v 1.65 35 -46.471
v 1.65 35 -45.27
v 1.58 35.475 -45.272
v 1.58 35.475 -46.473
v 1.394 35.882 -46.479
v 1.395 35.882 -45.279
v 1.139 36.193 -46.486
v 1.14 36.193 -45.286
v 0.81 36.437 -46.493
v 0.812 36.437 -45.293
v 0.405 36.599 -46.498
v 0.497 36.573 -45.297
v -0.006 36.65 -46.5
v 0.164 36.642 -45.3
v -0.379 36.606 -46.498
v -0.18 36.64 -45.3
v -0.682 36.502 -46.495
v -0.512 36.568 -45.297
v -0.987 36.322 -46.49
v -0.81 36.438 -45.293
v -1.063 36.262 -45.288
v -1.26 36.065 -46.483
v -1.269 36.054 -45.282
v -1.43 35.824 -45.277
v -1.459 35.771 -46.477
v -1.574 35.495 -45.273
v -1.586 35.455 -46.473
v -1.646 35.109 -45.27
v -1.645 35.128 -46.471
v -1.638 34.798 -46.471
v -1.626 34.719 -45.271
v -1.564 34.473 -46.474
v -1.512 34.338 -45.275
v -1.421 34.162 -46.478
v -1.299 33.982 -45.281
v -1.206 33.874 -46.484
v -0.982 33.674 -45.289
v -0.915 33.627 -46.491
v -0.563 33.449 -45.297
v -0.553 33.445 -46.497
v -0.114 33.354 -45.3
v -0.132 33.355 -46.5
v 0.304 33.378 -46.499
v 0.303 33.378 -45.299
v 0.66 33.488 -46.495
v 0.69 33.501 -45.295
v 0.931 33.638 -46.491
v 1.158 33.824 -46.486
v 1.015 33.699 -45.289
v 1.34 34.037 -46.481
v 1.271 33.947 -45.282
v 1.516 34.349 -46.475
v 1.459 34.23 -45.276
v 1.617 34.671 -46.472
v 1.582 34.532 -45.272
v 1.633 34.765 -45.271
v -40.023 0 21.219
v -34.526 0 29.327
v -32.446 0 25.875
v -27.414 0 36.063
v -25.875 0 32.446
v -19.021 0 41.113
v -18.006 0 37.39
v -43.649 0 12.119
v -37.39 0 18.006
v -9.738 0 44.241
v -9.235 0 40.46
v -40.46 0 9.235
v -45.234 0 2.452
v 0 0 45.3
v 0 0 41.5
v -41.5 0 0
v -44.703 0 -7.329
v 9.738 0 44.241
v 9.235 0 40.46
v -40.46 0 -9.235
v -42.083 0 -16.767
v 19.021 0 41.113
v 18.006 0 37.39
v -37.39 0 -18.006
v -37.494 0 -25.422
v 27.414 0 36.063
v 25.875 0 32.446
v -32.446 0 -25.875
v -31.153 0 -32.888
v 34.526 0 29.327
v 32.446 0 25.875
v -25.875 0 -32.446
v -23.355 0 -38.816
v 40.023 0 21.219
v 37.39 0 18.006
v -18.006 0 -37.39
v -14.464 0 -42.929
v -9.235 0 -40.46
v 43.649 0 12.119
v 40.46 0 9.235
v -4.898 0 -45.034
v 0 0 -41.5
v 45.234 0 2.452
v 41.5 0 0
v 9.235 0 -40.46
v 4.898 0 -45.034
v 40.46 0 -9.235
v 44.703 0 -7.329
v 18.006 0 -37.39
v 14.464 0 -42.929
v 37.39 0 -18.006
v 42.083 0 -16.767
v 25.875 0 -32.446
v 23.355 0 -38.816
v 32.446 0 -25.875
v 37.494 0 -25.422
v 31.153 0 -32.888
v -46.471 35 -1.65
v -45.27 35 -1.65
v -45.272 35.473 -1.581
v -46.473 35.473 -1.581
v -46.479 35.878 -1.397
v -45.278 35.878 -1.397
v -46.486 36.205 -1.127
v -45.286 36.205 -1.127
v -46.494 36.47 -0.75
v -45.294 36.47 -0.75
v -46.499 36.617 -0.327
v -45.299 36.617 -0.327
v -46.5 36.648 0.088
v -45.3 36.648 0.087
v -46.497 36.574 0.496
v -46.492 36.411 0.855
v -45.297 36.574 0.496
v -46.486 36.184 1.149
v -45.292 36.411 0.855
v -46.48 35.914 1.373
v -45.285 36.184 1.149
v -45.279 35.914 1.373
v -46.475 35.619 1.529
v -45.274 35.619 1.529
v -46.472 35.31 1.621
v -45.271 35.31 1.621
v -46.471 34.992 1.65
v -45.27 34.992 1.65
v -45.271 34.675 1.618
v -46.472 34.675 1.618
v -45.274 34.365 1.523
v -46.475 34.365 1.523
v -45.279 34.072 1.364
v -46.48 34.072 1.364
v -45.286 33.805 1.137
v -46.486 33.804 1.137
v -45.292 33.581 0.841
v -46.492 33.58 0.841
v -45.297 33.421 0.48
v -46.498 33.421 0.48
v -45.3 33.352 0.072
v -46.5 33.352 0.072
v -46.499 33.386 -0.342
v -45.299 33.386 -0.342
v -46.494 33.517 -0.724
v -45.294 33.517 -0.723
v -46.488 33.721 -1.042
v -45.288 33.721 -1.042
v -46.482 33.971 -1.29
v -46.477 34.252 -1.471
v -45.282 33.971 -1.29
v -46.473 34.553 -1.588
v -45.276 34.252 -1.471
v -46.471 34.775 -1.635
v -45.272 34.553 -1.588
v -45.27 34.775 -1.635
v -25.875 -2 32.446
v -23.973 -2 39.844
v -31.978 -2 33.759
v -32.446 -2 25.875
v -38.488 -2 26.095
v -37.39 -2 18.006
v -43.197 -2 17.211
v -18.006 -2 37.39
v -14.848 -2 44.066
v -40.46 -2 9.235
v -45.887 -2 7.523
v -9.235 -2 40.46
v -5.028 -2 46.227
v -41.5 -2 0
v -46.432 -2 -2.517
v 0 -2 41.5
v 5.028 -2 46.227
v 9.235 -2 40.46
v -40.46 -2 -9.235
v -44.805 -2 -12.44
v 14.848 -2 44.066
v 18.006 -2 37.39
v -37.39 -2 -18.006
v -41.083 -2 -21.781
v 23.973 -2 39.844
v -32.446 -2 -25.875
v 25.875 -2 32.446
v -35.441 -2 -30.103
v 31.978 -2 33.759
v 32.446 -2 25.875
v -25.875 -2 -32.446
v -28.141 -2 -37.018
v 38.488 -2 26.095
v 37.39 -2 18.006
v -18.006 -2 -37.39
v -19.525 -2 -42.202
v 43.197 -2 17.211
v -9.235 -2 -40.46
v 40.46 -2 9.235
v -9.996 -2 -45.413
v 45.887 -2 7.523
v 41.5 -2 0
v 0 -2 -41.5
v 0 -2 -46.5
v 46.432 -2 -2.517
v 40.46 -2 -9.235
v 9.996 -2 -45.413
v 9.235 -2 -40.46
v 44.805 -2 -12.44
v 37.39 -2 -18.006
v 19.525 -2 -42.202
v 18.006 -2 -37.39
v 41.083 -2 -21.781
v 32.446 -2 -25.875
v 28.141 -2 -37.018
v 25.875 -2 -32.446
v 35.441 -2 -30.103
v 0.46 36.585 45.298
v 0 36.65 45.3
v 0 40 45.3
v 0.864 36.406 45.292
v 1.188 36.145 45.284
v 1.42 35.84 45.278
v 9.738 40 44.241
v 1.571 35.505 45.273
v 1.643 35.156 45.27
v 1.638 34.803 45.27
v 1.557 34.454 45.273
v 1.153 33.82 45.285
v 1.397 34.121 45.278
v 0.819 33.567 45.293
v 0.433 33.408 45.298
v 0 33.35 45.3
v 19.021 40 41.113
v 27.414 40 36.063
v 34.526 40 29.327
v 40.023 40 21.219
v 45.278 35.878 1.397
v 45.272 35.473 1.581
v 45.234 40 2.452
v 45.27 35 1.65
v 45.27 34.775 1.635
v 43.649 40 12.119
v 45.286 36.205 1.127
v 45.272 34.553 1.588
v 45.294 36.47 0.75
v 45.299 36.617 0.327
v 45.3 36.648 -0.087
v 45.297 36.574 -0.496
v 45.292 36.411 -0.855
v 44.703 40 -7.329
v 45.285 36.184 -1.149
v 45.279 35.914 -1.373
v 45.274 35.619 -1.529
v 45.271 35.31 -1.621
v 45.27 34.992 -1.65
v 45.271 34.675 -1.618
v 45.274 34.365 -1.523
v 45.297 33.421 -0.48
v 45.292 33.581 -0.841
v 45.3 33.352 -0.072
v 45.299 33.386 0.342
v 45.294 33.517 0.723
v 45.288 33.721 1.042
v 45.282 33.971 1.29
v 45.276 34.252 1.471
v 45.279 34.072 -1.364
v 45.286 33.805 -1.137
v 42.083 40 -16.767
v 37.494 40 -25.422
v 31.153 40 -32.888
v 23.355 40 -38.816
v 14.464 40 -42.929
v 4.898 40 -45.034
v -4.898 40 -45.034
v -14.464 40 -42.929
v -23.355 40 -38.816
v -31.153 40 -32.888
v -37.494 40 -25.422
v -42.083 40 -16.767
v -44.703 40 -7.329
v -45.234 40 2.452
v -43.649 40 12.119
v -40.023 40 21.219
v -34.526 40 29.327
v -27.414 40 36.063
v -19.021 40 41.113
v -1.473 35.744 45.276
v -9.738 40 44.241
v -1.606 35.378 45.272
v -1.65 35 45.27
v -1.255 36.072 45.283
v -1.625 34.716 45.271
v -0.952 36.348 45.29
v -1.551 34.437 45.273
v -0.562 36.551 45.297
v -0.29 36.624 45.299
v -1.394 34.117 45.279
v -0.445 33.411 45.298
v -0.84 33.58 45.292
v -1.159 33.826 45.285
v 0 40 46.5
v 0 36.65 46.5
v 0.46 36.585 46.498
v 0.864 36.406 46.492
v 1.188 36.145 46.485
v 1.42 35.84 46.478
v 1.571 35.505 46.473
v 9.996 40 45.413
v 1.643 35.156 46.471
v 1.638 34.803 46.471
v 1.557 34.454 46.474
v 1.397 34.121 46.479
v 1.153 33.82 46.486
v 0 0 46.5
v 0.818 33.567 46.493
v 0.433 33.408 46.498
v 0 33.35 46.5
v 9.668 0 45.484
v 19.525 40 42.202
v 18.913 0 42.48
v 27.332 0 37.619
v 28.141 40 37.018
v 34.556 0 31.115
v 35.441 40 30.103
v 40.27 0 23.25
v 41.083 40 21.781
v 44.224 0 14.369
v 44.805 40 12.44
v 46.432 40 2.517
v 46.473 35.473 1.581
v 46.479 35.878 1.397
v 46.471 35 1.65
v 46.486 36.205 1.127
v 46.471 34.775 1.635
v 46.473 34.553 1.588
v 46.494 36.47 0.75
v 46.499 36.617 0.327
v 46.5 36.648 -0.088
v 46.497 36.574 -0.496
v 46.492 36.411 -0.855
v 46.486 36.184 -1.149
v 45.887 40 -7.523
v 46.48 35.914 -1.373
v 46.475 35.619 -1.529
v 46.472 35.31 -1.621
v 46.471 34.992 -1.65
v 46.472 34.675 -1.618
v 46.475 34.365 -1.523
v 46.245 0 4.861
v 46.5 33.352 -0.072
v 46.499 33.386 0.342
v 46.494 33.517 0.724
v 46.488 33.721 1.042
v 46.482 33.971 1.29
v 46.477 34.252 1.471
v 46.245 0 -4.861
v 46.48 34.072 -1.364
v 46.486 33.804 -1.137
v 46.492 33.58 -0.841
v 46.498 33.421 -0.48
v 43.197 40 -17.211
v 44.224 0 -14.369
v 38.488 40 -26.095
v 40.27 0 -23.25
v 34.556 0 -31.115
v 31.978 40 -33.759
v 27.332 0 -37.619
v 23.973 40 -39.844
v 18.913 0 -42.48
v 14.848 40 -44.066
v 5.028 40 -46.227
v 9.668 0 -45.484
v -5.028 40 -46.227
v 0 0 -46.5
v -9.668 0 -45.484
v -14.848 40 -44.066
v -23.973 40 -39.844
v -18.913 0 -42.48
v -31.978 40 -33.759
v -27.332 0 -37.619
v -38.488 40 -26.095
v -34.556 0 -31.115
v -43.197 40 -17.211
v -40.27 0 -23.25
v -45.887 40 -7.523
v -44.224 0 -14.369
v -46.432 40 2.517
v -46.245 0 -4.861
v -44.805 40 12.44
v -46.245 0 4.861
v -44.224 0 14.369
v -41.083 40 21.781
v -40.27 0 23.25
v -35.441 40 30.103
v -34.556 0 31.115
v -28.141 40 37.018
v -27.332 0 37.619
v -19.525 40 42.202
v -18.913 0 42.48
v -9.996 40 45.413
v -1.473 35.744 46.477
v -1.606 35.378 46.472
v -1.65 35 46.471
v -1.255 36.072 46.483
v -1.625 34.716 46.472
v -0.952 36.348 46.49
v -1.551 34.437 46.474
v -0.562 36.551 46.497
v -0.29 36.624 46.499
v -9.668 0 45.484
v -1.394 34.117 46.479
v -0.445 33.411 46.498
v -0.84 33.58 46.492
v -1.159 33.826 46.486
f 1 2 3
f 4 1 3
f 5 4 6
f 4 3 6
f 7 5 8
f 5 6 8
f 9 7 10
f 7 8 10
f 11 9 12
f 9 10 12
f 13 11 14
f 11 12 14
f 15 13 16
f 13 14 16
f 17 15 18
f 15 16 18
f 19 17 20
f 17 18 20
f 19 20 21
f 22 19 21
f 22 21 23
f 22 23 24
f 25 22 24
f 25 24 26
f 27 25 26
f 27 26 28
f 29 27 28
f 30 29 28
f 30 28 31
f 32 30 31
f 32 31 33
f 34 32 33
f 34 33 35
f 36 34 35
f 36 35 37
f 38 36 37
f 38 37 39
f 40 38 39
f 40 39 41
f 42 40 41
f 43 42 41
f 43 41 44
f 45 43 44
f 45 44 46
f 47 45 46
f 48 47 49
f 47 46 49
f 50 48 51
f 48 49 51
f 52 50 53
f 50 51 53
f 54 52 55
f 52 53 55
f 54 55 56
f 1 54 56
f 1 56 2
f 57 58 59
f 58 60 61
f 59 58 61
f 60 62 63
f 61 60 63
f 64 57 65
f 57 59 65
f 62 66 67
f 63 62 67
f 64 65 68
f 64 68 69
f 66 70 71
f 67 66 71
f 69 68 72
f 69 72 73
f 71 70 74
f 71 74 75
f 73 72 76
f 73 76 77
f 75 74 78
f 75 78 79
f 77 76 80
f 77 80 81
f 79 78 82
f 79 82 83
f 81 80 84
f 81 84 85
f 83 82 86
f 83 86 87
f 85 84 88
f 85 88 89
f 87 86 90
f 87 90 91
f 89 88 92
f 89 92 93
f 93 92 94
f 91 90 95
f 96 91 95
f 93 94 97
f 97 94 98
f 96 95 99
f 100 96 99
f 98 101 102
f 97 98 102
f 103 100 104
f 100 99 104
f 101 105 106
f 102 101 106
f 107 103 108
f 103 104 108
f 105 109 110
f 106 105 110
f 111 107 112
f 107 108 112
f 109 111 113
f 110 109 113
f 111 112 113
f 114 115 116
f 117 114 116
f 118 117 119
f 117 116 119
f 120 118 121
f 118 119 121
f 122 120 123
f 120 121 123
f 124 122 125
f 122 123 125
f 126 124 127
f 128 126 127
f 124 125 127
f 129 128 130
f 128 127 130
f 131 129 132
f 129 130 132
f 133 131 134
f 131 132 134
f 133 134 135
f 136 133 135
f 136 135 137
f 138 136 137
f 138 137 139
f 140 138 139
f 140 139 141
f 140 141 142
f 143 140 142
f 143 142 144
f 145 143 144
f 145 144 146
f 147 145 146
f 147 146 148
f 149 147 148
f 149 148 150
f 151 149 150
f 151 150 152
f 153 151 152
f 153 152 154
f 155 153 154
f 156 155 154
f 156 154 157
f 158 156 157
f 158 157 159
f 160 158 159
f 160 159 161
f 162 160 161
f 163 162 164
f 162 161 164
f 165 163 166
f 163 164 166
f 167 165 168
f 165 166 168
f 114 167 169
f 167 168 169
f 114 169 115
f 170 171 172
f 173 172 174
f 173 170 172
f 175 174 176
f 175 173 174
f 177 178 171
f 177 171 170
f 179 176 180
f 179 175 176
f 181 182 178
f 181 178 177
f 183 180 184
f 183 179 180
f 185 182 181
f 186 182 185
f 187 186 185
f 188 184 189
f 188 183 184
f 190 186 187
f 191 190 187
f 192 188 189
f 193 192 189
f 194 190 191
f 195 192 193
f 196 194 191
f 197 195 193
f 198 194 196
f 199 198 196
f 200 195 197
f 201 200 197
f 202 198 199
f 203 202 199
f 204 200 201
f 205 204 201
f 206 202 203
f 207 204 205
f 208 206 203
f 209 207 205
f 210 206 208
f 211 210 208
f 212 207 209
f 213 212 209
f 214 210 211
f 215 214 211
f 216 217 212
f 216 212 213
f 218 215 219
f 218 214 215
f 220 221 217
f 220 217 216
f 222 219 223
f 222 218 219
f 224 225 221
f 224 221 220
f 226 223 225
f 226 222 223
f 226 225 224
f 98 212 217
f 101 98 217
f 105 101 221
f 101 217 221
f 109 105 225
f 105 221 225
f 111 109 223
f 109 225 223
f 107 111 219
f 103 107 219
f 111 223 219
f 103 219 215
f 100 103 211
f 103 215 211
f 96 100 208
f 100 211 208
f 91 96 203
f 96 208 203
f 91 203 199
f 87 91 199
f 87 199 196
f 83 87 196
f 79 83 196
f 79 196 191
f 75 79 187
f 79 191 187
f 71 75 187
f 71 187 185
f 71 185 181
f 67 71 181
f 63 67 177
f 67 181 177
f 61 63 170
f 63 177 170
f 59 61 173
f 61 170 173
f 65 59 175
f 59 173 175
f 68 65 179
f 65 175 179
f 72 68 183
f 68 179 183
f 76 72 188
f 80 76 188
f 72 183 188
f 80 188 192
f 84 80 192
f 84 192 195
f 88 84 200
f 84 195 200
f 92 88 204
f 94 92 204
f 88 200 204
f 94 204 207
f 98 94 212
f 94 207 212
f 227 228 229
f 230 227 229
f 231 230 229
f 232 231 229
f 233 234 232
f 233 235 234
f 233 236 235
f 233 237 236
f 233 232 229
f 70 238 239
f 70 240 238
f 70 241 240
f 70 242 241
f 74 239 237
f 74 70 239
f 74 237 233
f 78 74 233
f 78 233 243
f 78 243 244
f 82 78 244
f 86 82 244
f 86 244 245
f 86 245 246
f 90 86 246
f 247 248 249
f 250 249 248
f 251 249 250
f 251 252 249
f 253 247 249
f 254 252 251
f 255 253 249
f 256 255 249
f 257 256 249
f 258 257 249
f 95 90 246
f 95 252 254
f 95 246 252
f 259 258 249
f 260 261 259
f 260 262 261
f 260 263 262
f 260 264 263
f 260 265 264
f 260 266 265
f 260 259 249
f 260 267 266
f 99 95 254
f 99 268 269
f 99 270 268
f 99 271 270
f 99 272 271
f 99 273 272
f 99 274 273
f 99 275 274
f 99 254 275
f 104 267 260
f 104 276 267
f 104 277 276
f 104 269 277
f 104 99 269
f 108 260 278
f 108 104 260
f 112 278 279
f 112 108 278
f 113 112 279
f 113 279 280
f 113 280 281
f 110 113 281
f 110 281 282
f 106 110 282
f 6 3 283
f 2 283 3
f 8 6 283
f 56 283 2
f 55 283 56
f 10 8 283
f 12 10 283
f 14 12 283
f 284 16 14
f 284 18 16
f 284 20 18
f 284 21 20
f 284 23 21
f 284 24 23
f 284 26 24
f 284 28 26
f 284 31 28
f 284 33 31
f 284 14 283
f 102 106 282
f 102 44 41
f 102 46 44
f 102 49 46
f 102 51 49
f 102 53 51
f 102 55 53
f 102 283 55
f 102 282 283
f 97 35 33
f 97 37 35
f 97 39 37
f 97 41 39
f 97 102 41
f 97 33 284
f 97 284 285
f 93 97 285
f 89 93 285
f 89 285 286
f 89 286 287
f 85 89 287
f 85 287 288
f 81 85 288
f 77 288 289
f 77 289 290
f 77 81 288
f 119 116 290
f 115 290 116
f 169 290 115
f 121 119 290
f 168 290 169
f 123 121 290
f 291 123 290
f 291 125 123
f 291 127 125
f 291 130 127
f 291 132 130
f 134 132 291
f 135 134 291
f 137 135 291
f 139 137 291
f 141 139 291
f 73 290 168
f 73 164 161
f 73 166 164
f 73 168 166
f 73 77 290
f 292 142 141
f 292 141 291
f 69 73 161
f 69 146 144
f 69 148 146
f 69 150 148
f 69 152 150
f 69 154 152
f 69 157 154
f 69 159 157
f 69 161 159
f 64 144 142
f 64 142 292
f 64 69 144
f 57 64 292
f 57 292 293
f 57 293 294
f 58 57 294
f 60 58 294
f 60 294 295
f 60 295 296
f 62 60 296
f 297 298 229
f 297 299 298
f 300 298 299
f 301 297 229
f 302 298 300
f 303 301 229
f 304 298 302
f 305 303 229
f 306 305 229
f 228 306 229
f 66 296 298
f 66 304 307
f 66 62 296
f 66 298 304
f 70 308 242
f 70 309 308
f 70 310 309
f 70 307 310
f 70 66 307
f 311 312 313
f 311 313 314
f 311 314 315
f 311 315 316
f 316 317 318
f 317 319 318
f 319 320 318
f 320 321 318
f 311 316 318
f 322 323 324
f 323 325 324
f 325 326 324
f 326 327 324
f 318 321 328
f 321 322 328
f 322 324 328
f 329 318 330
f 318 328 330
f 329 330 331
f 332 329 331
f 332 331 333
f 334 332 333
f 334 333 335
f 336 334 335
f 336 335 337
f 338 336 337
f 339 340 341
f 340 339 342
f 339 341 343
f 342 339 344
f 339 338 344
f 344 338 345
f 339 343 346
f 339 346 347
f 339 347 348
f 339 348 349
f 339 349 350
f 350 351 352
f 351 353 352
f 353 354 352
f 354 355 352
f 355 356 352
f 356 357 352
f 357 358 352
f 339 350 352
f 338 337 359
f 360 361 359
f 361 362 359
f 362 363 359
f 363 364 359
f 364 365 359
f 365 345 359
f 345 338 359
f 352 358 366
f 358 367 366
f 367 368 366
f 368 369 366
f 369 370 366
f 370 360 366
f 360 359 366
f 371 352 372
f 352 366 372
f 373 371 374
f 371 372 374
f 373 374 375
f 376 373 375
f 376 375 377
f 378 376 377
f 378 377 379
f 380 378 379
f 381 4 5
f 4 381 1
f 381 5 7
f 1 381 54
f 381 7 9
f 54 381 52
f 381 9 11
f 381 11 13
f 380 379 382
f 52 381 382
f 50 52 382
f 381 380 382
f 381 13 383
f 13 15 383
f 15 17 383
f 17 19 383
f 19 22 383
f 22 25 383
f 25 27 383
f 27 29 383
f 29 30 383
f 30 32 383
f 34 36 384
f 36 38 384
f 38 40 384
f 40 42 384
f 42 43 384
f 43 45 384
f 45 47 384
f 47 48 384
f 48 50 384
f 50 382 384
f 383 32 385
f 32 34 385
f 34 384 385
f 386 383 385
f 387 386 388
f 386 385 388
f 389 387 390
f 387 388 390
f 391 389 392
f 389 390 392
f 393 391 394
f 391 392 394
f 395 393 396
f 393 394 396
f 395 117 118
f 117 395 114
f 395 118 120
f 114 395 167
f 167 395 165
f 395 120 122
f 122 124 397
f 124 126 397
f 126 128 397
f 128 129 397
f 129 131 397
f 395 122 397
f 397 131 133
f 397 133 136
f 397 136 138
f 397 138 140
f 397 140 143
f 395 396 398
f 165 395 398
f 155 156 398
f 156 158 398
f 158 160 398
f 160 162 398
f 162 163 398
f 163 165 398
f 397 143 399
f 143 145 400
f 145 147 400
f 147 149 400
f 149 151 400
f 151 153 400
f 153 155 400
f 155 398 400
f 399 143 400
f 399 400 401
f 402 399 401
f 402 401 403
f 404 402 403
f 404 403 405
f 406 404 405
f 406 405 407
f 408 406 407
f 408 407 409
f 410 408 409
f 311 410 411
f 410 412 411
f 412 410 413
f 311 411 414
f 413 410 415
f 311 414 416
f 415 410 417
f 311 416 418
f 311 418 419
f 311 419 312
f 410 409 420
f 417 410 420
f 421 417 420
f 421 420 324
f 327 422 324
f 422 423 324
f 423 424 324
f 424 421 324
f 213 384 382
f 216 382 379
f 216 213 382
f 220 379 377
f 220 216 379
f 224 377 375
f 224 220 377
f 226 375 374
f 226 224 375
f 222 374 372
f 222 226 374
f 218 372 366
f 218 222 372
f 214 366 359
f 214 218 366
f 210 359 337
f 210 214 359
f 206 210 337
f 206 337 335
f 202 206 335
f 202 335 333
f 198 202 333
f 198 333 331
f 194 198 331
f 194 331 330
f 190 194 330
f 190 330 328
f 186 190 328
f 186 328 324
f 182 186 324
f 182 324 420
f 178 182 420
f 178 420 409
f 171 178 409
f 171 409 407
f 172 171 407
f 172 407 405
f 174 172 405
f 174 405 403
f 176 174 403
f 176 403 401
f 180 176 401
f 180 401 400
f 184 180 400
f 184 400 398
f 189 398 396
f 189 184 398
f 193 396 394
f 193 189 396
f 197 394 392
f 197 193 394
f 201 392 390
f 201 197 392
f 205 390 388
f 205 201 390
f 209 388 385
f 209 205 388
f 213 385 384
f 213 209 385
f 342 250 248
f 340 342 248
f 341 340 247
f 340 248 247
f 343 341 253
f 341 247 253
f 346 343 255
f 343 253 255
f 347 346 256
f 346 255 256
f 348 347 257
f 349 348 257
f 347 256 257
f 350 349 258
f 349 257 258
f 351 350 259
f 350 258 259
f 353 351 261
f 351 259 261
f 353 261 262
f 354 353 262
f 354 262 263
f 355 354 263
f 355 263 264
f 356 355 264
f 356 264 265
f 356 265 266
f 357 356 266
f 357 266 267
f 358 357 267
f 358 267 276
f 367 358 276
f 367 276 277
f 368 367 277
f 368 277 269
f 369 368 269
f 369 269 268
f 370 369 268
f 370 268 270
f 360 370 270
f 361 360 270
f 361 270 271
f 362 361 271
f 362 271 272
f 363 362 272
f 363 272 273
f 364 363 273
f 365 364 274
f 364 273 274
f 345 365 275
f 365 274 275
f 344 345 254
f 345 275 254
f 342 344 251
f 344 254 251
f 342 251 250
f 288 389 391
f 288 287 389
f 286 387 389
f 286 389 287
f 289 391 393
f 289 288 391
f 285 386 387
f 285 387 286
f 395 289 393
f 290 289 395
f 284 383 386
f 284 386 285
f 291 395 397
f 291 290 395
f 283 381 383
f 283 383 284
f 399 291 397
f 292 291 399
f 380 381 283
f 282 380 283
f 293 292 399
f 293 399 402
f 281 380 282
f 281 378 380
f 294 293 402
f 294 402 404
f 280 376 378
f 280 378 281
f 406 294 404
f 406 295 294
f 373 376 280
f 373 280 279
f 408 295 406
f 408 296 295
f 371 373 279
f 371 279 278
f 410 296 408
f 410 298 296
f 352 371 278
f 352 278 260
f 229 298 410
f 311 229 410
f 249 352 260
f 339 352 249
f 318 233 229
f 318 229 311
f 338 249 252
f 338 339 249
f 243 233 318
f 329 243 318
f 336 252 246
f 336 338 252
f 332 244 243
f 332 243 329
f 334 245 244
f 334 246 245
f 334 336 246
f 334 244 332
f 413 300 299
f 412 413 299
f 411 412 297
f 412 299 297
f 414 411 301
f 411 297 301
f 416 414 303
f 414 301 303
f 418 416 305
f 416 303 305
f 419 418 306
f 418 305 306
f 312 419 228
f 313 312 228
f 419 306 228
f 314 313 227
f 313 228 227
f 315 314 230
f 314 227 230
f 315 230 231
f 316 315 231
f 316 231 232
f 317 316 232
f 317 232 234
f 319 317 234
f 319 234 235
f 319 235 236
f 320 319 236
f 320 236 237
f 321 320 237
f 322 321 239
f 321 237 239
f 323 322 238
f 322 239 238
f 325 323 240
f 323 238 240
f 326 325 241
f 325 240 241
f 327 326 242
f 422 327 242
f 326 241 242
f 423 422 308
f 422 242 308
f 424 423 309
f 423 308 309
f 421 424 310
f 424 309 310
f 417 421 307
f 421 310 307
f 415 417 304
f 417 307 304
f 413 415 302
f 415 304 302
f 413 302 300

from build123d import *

# Parameters (mm, degrees)
SKETCH1_R           = 46.5
SKETCH1_R_2         = 45.3
BOSS_EXTRUDE1_DEPTH = 40
SKETCH2_R           = 1.65
CUT_EXTRUDE1_DEPTH  = 77.970773674
CIRPATTERN1_COUNT   = 4
BOSS_EXTRUDE2_START = 2
SKETCH3_R           = 46.5
SKETCH3_R_2         = 41.5
BOSS_EXTRUDE2_DEPTH = 2


with BuildPart() as part:
    # Sketch1 → Boss-Extrude1 (new body)
    with BuildSketch(Plane(origin=(0, 0, 0), x_dir=(1, 0, 0), z_dir=(0, 1, 0))):
        with Locations(Location((0, 0, 0), (0, 0, 270))):
            Circle(SKETCH1_R)
        with Locations(Location((0, 0, 0), (0, 0, 270))):
            Circle(SKETCH1_R_2, mode=Mode.SUBTRACT)
    extrude(amount=BOSS_EXTRUDE1_DEPTH)

    # Sketch2 → Cut-Extrude1 (cut, through all)
    with BuildSketch(Plane(origin=(0, 0, 0), x_dir=(0, 0, -1), z_dir=(1, 0, 0))):
        with Locations((0, 35)):
            Circle(SKETCH2_R)
    cut_extrude1 = extrude(amount=-CUT_EXTRUDE1_DEPTH, mode=Mode.SUBTRACT)

    # CirPattern1: Cut-Extrude1 ×4 about axis
    cirpattern1_axis = Axis((0, 40, 0), (0, -1, 0))
    for i in range(1, CIRPATTERN1_COUNT):
        add(cut_extrude1.rotate(cirpattern1_axis, i * 360 / CIRPATTERN1_COUNT), mode=Mode.SUBTRACT)

    # Sketch3 → Boss-Extrude2 (add)
    with BuildSketch(Plane.XZ.offset(BOSS_EXTRUDE2_START)):
        with Locations(Location((0, 0, 0), (0, 0, 270))):
            Circle(SKETCH3_R)
        with Locations(Location((0, 0, 0), (0, 0, 270))):
            Circle(SKETCH3_R_2, mode=Mode.SUBTRACT)
    extrude(amount=-BOSS_EXTRUDE2_DEPTH)


solid = part.part
